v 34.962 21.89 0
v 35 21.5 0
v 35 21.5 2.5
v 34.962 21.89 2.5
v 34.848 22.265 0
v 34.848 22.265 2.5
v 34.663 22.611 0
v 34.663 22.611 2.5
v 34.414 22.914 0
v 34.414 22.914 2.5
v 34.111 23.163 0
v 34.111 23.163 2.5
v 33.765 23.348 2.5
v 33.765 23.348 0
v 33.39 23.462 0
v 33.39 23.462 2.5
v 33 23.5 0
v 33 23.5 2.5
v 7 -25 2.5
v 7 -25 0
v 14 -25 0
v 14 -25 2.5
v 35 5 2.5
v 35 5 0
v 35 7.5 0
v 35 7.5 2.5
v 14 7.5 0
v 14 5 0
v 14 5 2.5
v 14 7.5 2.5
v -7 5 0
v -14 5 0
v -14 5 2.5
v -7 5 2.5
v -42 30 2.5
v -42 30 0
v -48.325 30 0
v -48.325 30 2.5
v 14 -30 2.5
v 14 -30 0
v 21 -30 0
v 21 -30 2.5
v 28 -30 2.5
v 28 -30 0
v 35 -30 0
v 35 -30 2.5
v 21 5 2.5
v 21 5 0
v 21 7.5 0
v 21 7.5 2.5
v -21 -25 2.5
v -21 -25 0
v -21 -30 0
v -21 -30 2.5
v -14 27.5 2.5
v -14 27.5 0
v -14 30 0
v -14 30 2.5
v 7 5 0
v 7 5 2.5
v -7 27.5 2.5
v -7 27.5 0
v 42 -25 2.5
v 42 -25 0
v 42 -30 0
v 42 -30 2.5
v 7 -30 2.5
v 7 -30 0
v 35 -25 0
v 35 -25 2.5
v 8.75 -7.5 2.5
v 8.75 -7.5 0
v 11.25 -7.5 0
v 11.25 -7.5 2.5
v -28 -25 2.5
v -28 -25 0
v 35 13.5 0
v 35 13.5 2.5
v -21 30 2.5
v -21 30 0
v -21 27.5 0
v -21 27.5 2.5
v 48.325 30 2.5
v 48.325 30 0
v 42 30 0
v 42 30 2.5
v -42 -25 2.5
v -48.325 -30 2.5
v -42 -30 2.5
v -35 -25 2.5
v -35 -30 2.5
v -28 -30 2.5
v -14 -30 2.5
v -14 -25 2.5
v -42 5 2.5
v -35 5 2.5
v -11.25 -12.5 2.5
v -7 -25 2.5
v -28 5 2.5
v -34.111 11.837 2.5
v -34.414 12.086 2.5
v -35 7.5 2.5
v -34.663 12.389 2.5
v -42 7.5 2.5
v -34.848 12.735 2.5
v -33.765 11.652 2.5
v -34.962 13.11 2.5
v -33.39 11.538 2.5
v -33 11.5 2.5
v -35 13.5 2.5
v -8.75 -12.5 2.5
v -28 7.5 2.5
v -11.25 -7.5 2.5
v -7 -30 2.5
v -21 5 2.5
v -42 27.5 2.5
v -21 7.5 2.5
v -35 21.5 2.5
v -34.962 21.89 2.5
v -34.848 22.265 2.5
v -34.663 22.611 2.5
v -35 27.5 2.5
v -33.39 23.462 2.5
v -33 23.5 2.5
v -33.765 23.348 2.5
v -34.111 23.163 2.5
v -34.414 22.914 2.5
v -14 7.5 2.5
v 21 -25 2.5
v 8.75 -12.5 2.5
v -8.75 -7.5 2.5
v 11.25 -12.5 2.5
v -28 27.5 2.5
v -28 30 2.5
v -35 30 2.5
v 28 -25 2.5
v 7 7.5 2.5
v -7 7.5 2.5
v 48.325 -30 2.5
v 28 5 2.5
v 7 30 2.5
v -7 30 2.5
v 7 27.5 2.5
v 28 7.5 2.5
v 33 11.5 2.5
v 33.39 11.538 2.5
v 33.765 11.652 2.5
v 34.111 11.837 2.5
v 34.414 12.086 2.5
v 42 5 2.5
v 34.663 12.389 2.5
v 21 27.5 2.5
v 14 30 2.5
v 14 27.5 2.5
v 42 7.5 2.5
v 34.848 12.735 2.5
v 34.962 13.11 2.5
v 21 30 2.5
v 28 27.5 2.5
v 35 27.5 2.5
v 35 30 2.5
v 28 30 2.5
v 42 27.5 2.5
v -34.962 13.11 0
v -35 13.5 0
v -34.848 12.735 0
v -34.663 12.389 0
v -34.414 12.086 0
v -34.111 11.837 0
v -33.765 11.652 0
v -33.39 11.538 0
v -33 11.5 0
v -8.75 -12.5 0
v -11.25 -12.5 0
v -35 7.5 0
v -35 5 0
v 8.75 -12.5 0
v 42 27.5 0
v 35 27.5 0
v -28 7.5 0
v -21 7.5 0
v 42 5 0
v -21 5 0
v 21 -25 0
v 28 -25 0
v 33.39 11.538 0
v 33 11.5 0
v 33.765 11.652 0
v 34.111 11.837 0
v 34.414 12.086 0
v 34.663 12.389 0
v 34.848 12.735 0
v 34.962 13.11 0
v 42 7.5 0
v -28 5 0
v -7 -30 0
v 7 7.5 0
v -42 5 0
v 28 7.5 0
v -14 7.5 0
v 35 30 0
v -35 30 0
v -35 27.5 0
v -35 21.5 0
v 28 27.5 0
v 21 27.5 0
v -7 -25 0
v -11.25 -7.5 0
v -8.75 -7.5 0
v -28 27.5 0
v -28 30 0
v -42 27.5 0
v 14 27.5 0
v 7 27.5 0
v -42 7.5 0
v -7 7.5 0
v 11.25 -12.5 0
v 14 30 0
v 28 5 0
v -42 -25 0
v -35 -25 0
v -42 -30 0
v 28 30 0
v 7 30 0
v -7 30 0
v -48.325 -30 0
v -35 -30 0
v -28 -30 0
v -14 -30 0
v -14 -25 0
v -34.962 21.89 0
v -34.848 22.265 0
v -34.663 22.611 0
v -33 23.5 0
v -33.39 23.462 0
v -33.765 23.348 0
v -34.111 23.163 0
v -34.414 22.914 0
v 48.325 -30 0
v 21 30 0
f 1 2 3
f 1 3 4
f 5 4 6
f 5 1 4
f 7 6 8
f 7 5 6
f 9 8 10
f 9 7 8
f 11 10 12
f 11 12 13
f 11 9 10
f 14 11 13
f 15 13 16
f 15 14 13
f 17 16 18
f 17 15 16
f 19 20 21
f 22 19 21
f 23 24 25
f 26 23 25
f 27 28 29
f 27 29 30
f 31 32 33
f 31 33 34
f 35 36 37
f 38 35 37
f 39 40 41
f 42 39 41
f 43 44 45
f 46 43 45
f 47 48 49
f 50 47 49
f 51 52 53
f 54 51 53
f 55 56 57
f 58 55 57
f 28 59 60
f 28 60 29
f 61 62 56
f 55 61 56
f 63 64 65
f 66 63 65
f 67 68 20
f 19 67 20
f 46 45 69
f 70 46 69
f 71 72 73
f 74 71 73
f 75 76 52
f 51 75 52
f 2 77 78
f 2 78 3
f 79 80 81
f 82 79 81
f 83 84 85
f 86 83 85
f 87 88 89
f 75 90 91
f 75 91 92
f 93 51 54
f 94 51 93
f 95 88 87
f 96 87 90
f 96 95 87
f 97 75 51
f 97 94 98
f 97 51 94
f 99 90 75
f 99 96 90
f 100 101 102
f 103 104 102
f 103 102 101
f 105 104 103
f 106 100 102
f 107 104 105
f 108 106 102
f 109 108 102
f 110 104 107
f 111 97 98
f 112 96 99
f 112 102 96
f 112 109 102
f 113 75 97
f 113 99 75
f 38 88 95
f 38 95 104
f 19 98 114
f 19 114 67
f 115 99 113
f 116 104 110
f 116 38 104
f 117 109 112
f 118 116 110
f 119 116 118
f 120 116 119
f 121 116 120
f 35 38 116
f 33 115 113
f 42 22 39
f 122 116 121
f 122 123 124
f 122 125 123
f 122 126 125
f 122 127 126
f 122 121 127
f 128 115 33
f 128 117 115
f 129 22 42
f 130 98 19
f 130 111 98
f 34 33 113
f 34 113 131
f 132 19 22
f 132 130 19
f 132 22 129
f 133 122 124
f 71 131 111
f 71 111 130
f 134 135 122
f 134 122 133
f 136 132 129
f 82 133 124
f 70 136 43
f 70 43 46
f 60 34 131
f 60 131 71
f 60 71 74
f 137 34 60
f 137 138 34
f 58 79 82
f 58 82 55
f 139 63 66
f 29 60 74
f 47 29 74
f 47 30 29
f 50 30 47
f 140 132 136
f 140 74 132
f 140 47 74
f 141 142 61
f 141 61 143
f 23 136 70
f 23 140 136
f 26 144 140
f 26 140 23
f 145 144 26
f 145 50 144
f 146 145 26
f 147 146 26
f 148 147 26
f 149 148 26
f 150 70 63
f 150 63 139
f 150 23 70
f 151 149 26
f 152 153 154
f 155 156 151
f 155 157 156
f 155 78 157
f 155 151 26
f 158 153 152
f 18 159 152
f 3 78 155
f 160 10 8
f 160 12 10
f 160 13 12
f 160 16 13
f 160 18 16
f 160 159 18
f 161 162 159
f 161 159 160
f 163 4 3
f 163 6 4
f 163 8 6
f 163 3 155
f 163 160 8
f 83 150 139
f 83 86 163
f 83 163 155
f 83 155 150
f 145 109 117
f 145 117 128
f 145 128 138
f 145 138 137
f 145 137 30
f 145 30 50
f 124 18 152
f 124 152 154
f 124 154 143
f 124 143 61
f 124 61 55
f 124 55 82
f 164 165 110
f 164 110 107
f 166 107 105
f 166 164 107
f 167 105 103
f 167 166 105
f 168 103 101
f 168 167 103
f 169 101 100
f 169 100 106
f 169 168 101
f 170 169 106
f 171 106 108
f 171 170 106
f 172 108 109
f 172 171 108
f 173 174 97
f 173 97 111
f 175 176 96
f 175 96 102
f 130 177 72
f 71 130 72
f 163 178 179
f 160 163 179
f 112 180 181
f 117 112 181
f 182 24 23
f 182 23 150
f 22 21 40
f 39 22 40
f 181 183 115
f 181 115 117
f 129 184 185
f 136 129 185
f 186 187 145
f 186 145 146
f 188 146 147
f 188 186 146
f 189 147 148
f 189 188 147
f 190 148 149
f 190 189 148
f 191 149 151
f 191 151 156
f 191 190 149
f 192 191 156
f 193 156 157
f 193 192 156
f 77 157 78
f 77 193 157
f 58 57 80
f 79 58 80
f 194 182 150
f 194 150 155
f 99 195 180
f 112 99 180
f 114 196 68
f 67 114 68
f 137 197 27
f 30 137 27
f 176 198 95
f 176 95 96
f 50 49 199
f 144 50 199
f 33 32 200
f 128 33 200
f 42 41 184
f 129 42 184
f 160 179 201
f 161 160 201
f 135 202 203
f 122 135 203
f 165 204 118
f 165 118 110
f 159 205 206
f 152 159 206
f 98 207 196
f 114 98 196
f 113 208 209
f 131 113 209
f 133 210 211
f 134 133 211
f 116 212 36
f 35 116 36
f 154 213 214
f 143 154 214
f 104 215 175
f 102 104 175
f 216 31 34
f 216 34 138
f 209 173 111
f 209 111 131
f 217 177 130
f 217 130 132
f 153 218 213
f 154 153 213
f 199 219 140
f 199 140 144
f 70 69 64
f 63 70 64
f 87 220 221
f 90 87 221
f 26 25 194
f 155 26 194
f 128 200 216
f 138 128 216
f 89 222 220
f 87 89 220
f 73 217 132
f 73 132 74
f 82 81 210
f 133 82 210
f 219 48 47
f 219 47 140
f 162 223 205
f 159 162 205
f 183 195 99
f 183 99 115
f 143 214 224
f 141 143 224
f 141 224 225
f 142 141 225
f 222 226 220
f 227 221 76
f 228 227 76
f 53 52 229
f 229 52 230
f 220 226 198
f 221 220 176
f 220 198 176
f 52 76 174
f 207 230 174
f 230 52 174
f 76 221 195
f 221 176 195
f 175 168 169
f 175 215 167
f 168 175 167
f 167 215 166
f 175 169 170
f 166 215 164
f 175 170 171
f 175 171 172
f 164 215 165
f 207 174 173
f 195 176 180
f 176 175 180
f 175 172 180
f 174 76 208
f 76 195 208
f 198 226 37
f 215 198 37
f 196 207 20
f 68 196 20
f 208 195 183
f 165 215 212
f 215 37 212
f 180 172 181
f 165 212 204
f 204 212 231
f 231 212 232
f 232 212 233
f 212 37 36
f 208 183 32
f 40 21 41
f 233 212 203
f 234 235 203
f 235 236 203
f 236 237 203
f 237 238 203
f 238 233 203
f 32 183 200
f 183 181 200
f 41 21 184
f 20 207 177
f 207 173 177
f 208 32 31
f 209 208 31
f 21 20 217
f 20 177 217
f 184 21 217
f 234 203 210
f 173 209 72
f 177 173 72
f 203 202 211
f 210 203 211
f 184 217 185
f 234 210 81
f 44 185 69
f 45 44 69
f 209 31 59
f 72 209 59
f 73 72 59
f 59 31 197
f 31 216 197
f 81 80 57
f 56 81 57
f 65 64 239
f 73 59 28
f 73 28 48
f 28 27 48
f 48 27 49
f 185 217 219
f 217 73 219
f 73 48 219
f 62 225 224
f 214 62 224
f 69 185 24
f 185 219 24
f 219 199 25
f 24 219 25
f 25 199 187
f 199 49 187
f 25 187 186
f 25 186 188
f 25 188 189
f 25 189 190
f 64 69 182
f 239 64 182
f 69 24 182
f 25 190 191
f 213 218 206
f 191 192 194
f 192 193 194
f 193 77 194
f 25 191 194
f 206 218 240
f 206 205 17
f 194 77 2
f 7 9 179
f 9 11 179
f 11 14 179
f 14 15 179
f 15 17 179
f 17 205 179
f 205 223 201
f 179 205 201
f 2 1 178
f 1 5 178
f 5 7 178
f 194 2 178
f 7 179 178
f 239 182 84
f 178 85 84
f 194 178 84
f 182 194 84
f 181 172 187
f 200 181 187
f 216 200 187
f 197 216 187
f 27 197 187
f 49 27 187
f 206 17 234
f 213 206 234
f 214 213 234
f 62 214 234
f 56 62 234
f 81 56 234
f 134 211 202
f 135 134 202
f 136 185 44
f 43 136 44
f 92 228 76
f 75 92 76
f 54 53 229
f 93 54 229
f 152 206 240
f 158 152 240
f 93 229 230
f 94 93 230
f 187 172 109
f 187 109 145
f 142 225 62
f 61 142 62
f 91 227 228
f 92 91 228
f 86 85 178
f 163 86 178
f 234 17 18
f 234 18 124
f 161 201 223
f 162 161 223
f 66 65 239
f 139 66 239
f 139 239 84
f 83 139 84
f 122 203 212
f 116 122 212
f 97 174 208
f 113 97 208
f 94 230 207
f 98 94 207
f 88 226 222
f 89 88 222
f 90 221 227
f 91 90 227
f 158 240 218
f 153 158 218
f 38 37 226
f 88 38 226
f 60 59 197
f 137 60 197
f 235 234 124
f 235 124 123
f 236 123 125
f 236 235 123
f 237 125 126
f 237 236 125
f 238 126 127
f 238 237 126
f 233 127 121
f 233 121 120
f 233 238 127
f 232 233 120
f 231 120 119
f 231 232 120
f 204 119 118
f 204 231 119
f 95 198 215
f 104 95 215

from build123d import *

# Parameters (mm, degrees)
SKETCH1_W           = 7
SKETCH1_H           = 2.5
SKETCH1_W_2         = 2.5
SKETCH1_H_2         = 5
BOSS_EXTRUDE1_DEPTH = 2.5


with BuildPart() as part:
    # Sketch1 → Boss-Extrude1 (new body)
    with BuildSketch(Plane.XY):
        Polygon((-48.325, -30), (-42, -30), (-42, -25), (-35, -25), (-35, -30), (-28, -30), (-28, -25), (-21, -25), (-21, -30), (-14, -30), (-14, -25), (-7, -25), (-7, -30), (7, -30), (7, -25), (14, -25), (14, -30), (21, -30), (21, -25), (28, -25), (28, -30), (35, -30), (35, -25), (42, -25), (42, -30), (48.325, -30), (48.325, 30), (42, 30), (42, 27.5), (35, 27.5), (35, 30), (28, 30), (28, 27.5), (21, 27.5), (21, 30), (14, 30), (14, 27.5), (7, 27.5), (7, 30), (-7, 30), (-7, 27.5), (-14, 27.5), (-14, 30), (-21, 30), (-21, 27.5), (-28, 27.5), (-28, 30), (-35, 30), (-35, 27.5), (-42, 27.5), (-42, 30), (-48.325, 30), align=None)
        with Locations((24.5, 6.25)):
            Rectangle(SKETCH1_W, SKETCH1_H, mode=Mode.SUBTRACT)
        with Locations((38.5, 6.25)):
            Rectangle(SKETCH1_W, SKETCH1_H, mode=Mode.SUBTRACT)
        with Locations((10.5, 6.25)):
            Rectangle(SKETCH1_W, SKETCH1_H, mode=Mode.SUBTRACT)
        with Locations((-38.5, 6.25)):
            Rectangle(SKETCH1_W, SKETCH1_H, mode=Mode.SUBTRACT)
        with Locations((-24.5, 6.25)):
            Rectangle(SKETCH1_W, SKETCH1_H, mode=Mode.SUBTRACT)
        with Locations((-10.5, 6.25)):
            Rectangle(SKETCH1_W, SKETCH1_H, mode=Mode.SUBTRACT)
        with Locations((-10, -10)):
            Rectangle(SKETCH1_W_2, SKETCH1_H_2, mode=Mode.SUBTRACT)
        with BuildLine():
            Line((-33, 11.5), (33, 11.5))
            ThreePointArc((33, 11.5), (34.414213562, 12.085786438), (35, 13.5))
            Line((35, 13.5), (35, 21.5))
            ThreePointArc((35, 21.5), (34.414213562, 22.914213562), (33, 23.5))
            Line((33, 23.5), (-33, 23.5))
            ThreePointArc((-33, 23.5), (-34.414213562, 22.914213562), (-35, 21.5))
            Line((-35, 21.5), (-35, 13.5))
            ThreePointArc((-35, 13.5), (-34.414213562, 12.085786438), (-33, 11.5))
        make_face(mode=Mode.SUBTRACT)
        with Locations((10, -10)):
            Rectangle(SKETCH1_W_2, SKETCH1_H_2, mode=Mode.SUBTRACT)
    extrude(amount=BOSS_EXTRUDE1_DEPTH)


solid = part.part
